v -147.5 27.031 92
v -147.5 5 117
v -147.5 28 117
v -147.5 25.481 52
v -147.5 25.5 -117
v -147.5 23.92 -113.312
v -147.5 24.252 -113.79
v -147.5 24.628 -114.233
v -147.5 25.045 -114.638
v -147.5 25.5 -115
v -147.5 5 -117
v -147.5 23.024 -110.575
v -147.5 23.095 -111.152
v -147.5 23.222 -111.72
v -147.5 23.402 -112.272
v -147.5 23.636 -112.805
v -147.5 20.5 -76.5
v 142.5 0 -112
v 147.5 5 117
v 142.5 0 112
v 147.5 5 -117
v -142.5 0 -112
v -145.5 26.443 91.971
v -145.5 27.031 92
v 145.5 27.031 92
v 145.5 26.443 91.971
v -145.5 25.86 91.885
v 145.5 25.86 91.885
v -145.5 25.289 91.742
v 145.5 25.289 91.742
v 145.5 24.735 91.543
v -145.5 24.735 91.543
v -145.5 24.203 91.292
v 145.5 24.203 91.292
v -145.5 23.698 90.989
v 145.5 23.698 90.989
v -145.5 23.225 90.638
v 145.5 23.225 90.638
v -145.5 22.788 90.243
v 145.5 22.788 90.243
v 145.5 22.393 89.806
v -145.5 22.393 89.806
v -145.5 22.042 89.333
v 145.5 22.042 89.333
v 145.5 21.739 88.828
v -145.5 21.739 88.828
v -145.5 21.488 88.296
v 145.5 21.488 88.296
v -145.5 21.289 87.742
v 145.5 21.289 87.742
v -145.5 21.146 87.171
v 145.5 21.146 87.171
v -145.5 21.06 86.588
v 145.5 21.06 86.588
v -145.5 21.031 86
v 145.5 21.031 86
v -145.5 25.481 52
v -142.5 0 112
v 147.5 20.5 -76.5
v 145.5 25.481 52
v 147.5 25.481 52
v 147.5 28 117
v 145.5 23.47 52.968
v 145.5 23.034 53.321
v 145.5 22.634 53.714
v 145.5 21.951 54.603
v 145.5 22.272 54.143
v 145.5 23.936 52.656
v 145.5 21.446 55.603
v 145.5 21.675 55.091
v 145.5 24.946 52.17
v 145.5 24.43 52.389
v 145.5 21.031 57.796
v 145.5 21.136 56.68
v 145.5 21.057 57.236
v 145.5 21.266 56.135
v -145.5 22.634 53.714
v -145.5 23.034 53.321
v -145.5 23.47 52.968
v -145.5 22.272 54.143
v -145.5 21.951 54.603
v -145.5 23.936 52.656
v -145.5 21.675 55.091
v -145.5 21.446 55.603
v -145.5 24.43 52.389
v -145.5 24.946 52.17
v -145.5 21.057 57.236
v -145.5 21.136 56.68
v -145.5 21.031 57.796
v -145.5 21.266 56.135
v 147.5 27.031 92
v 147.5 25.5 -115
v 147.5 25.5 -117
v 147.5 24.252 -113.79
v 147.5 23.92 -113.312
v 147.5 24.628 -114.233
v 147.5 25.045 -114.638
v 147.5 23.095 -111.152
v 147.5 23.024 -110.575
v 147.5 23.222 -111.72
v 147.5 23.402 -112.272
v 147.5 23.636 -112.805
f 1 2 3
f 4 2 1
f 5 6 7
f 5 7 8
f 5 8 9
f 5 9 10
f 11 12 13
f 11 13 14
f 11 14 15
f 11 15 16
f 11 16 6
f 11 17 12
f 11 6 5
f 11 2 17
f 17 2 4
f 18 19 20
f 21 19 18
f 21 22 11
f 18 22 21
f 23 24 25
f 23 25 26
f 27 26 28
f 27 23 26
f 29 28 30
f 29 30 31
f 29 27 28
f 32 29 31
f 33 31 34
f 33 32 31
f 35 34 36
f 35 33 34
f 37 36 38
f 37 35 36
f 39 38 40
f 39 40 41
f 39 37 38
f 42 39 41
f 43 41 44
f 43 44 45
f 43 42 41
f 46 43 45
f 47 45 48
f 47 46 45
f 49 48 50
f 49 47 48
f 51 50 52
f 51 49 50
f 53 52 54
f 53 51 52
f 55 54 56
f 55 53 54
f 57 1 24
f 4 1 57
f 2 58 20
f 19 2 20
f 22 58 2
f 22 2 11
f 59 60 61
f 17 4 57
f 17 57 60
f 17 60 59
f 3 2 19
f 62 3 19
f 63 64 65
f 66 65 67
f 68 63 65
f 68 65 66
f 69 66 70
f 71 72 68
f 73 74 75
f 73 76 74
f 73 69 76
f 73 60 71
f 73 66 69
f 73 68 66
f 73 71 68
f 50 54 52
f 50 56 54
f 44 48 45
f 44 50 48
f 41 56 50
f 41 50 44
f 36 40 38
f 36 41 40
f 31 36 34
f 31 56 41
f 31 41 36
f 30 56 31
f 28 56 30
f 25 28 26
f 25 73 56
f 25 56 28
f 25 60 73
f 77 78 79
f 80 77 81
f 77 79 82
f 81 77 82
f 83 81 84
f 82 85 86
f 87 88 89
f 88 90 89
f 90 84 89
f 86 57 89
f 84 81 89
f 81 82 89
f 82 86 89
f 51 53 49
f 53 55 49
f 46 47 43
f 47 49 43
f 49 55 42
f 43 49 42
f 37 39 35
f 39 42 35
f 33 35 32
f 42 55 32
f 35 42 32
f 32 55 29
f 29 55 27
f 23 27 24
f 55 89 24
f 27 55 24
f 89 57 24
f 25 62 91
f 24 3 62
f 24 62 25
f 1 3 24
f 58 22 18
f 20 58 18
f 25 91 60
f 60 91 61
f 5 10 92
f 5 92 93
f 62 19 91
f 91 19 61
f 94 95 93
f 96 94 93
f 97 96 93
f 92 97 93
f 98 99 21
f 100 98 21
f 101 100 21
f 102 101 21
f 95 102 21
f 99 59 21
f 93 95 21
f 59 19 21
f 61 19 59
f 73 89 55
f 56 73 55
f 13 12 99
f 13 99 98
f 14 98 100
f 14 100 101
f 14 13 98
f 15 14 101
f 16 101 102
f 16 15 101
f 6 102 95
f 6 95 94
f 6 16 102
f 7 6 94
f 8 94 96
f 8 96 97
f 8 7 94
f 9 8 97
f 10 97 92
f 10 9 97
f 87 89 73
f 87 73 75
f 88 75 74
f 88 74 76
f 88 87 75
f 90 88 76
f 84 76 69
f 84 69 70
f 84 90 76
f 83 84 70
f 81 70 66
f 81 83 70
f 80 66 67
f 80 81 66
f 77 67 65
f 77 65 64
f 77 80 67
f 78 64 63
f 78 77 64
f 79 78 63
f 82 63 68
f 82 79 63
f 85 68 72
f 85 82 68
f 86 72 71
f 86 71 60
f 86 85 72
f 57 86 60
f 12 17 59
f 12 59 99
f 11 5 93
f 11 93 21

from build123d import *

# Parameters (mm, degrees)
SKETCH1_W           = 295
SKETCH1_H           = 234
BOSS_EXTRUDE1_DEPTH = 28
CUT_EXTRUDE1_DEPTH  = 300
CHAMFER1_SIZE       = 5
CHAMFER2_SIZE       = 5
SKETCH3_W           = 40
SKETCH3_H           = 12.256911823
CUT_EXTRUDE2_DEPTH  = 300
BOSS_EXTRUDE2_DEPTH = 2
BOSS_EXTRUDE3_DEPTH = 295
FILLET1_R           = 6
FILLET2_R           = 6
CHAMFER3_SIZE       = 5


with BuildPart() as part:
    # Sketch1 → Boss-Extrude1 (new body)
    with BuildSketch(Plane(origin=(0, 0, 0), x_dir=(1, 0, 0), z_dir=(0, 1, 0))):
        Rectangle(SKETCH1_W, SKETCH1_H)
    extrude(amount=BOSS_EXTRUDE1_DEPTH)

    # Sketch2 → Cut-Extrude1 (cut)
    with BuildSketch(Plane.ZY.offset(147.5)):
        Polygon((117, 28), (-76.5, 20.5), (-117, 23.5), (-117, 28), align=None)
    extrude(amount=-CUT_EXTRUDE1_DEPTH, mode=Mode.SUBTRACT)

    # Chamfer1
    chamfer1_edges = [part.edges().sort_by_distance(p)[0] for p in [
        (147.5, 0, 0),
        (-147.5, 0, 0),
    ]]
    chamfer(chamfer1_edges, length=CHAMFER1_SIZE)

    # Chamfer2
    chamfer2_edges = [part.edges().sort_by_distance(p)[0] for p in [
        (0, 0, 117),
    ]]
    chamfer(chamfer2_edges, length=CHAMFER2_SIZE)

    # Sketch3 → Cut-Extrude2 (cut)
    with BuildSketch(Plane.ZY.offset(147.5)):
        with Locations((72, 27.159463664)):
            Rectangle(SKETCH3_W, SKETCH3_H)
    extrude(amount=-CUT_EXTRUDE2_DEPTH, mode=Mode.SUBTRACT)

    # Sketch4 → Boss-Extrude2 (add)
    with BuildSketch(Plane.ZY.offset(147.5)):
        Polygon((92, 27.031007752), (52, 25.480620155), (52, 21.031007752), (92, 21.031007752), align=None)
    boss_extrude2 = extrude(amount=-BOSS_EXTRUDE2_DEPTH)

    # Mirror1: Boss-Extrude2 across plane
    add(boss_extrude2.mirror(Plane(origin=(0, 0, 0), x_dir=(0, 0, 1), z_dir=(1, 0, 0))))

    # Sketch5 → Boss-Extrude3 (add)
    with BuildSketch(Plane.ZY.offset(147.5)):
        Polygon((-117, 23.5), (-115, 23.351851852), (-115, 25.5), (-117, 25.5), align=None)
    extrude(amount=-BOSS_EXTRUDE3_DEPTH)

    # Fillet1
    # the kernel refuses this fillet: 6 mm, written as the material it adds along each edge
    with BuildSketch(Plane(origin=(-147.5, 23.351851852, -115), x_dir=(0, -0.0738716855153118, 0.997267754456709), z_dir=(1, 0, 0))) as fillet1_piece_1:
        with BuildLine():
            CenterArc((4.436743859, -6), FILLET1_R, 90, 49.987589721)
            Line((-0.158687324, -2.14227888), (-0.250595948, -2.065124458))
            ThreePointArc((-0.250595948, -2.065124458), (-0.199015793, -1.062274838), (-0.119672131, 0.008864602))
            Line((-0.119672131, 0.008864602), (0, 0.12))
            Line((0, 0.12), (4.436743859, 0.12))
            Line((4.436743859, 0.12), (4.436743859, 0))
        make_face()
    extrude(amount=295)

    # Fillet2
    # the kernel refuses this fillet: 6 mm, written as the material it adds along each edge
    with BuildSketch(Plane(origin=(-145.5, 21.031007752, 92), x_dir=(0, 1, 0), z_dir=(1, 0, 0))) as fillet2_piece_1:
        with BuildLine():
            CenterArc((FILLET2_R, -FILLET2_R), FILLET2_R, 90, 90)
            Line((0, -FILLET2_R), (-FILLET2_R * 0.02, -FILLET2_R))
            Line((-FILLET2_R * 0.02, -FILLET2_R), (-FILLET2_R * 0.02, FILLET2_R * 0.02))
            Line((-FILLET2_R * 0.02, FILLET2_R * 0.02), (FILLET2_R, FILLET2_R * 0.02))
            Line((FILLET2_R, FILLET2_R * 0.02), (FILLET2_R, 0))
        make_face()
    extrude(amount=291)
    with BuildSketch(Plane(origin=(-145.5, 21.031007752, 52), x_dir=(0, 1, 0), z_dir=(1, 0, 0))) as fillet2_piece_2:
        with BuildLine():
            CenterArc((6, 5.796231388), FILLET2_R, 180, 75.024977641)
            Line((0, 5.796231388), (-0.12, 5.796231388))
            Line((-0.12, 5.796231388), (-0.12, 0))
            Line((-0.12, 0), (0, -0.12))
            ThreePointArc((0, -0.12), (2.224806202, -0.12), (4.418604651, -0.115924628))
            Line((4.418604651, -0.115924628), (4.449612403, 0))
        make_face()
    extrude(amount=291)

    # Chamfer3
    chamfer3_edges = [part.edges().sort_by_distance(p)[0] for p in [
        (0, 0, -117),
    ]]
    chamfer(chamfer3_edges, length=CHAMFER3_SIZE)


solid = part.part
